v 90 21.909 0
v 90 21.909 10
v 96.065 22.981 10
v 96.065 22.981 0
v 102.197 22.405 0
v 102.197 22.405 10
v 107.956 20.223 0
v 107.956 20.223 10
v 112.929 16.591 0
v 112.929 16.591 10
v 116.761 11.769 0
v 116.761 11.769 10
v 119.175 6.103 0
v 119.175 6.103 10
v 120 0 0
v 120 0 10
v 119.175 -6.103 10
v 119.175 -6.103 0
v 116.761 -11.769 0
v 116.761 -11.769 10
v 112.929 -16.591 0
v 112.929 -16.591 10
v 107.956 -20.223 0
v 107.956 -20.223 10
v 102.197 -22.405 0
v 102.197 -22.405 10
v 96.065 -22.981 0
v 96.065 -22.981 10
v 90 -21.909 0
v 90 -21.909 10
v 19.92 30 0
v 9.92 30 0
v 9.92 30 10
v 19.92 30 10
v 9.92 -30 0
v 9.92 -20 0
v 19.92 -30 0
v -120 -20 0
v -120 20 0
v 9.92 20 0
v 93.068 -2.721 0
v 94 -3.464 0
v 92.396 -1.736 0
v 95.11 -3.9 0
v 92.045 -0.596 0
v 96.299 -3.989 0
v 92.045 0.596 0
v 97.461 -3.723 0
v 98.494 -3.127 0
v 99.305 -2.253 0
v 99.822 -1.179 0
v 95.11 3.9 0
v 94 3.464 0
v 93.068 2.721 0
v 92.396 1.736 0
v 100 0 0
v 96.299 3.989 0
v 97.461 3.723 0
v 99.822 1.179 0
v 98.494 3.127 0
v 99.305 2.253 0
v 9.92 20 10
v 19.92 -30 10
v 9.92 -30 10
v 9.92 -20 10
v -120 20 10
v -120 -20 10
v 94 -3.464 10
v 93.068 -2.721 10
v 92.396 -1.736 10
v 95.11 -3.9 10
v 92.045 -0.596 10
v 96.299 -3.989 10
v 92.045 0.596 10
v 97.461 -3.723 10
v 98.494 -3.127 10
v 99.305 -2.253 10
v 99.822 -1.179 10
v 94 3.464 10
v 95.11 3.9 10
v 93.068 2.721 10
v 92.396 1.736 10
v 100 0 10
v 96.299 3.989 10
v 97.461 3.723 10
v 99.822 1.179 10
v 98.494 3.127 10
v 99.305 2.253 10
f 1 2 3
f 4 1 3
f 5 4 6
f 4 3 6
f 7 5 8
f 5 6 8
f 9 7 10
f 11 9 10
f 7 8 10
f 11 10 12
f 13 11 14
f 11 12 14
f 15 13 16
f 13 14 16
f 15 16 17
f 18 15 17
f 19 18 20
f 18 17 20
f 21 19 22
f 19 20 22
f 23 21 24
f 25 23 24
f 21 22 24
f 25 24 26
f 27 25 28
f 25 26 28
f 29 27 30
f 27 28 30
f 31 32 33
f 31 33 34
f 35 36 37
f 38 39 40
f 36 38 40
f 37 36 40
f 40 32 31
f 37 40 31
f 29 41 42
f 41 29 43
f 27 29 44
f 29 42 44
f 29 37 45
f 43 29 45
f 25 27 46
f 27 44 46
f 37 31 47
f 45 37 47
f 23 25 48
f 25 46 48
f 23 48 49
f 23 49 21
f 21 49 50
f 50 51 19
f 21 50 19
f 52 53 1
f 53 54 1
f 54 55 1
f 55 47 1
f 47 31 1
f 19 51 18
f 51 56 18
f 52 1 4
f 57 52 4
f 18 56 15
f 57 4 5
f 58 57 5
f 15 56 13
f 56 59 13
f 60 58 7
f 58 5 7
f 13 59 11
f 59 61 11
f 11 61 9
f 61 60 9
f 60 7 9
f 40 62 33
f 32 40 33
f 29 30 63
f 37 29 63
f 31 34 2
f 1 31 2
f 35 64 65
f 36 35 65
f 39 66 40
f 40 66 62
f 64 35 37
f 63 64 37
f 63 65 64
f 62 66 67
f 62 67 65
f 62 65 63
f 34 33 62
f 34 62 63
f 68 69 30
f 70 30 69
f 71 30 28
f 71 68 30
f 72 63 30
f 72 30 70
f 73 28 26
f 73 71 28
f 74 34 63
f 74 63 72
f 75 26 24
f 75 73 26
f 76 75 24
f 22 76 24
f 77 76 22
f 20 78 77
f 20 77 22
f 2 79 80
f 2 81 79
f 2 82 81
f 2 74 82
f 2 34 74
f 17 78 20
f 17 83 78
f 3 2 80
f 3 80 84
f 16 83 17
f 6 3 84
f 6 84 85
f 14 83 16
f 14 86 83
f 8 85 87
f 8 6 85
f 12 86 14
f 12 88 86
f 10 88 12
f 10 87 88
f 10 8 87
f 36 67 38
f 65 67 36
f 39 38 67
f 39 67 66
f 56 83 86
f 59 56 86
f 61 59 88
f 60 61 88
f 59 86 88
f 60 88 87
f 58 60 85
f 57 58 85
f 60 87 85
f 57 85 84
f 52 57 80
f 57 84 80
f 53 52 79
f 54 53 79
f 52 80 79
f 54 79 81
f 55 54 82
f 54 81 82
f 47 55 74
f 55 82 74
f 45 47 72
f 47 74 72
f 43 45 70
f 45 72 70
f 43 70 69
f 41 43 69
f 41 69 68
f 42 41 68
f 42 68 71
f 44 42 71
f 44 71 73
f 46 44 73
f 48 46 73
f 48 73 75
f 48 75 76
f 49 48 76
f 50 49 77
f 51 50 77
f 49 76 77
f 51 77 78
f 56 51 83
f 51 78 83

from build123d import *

# Parameters (mm, degrees)
SKETCH_1_W          = 240
SKETCH_1_H          = 60
EXTRUDE_1_DEPTH     = 10
SKETCH_2_W          = 129.92
SKETCH_2_H          = 10
CUT_EXTRUDE_2_DEPTH = 10
SKETCH_3_R          = 4
CUT_EXTRUDE_3_DEPTH = 10


with BuildPart() as part:
    # 草图1 → 凸台-拉伸1 (new body)
    with BuildSketch(Plane.XY):
        Rectangle(SKETCH_1_W, SKETCH_1_H)
    extrude(amount=EXTRUDE_1_DEPTH)

    # 草图2 → 切除-拉伸2 (cut)
    with BuildSketch(Plane.XY.offset(10)):
        Polygon((90, 30), (19.92, 30), (90, 21.9089023), align=None)
        with BuildLine():
            Line((90, 30), (90, 21.9089023))
            ThreePointArc((90, 21.9089023), (110.564659966, 18.574175621), (120, 0))
            Line((120, 0), (120, 30))
            Line((120, 30), (90, 30))
        make_face()
        with BuildLine():
            ThreePointArc((120, 0), (110.564659966, -18.574175621), (90, -21.9089023))
            Line((90, -21.9089023), (90, -30))
            Line((90, -30), (120, -30))
            Line((120, -30), (120, 0))
        make_face()
        Polygon((90, -21.9089023), (19.92, -30), (90, -30), align=None)
        with Locations((-55.04, 25)):
            Rectangle(SKETCH_2_W, SKETCH_2_H)
        with Locations((-55.04, -25)):
            Rectangle(SKETCH_2_W, SKETCH_2_H)
    extrude(amount=-CUT_EXTRUDE_2_DEPTH, mode=Mode.SUBTRACT)

    # 草图3 → 切除-拉伸3 (cut)
    with BuildSketch(Plane.XY.offset(10)):
        with Locations((96, 0)):
            Circle(SKETCH_3_R)
    extrude(amount=-CUT_EXTRUDE_3_DEPTH, mode=Mode.SUBTRACT)


solid = part.part
